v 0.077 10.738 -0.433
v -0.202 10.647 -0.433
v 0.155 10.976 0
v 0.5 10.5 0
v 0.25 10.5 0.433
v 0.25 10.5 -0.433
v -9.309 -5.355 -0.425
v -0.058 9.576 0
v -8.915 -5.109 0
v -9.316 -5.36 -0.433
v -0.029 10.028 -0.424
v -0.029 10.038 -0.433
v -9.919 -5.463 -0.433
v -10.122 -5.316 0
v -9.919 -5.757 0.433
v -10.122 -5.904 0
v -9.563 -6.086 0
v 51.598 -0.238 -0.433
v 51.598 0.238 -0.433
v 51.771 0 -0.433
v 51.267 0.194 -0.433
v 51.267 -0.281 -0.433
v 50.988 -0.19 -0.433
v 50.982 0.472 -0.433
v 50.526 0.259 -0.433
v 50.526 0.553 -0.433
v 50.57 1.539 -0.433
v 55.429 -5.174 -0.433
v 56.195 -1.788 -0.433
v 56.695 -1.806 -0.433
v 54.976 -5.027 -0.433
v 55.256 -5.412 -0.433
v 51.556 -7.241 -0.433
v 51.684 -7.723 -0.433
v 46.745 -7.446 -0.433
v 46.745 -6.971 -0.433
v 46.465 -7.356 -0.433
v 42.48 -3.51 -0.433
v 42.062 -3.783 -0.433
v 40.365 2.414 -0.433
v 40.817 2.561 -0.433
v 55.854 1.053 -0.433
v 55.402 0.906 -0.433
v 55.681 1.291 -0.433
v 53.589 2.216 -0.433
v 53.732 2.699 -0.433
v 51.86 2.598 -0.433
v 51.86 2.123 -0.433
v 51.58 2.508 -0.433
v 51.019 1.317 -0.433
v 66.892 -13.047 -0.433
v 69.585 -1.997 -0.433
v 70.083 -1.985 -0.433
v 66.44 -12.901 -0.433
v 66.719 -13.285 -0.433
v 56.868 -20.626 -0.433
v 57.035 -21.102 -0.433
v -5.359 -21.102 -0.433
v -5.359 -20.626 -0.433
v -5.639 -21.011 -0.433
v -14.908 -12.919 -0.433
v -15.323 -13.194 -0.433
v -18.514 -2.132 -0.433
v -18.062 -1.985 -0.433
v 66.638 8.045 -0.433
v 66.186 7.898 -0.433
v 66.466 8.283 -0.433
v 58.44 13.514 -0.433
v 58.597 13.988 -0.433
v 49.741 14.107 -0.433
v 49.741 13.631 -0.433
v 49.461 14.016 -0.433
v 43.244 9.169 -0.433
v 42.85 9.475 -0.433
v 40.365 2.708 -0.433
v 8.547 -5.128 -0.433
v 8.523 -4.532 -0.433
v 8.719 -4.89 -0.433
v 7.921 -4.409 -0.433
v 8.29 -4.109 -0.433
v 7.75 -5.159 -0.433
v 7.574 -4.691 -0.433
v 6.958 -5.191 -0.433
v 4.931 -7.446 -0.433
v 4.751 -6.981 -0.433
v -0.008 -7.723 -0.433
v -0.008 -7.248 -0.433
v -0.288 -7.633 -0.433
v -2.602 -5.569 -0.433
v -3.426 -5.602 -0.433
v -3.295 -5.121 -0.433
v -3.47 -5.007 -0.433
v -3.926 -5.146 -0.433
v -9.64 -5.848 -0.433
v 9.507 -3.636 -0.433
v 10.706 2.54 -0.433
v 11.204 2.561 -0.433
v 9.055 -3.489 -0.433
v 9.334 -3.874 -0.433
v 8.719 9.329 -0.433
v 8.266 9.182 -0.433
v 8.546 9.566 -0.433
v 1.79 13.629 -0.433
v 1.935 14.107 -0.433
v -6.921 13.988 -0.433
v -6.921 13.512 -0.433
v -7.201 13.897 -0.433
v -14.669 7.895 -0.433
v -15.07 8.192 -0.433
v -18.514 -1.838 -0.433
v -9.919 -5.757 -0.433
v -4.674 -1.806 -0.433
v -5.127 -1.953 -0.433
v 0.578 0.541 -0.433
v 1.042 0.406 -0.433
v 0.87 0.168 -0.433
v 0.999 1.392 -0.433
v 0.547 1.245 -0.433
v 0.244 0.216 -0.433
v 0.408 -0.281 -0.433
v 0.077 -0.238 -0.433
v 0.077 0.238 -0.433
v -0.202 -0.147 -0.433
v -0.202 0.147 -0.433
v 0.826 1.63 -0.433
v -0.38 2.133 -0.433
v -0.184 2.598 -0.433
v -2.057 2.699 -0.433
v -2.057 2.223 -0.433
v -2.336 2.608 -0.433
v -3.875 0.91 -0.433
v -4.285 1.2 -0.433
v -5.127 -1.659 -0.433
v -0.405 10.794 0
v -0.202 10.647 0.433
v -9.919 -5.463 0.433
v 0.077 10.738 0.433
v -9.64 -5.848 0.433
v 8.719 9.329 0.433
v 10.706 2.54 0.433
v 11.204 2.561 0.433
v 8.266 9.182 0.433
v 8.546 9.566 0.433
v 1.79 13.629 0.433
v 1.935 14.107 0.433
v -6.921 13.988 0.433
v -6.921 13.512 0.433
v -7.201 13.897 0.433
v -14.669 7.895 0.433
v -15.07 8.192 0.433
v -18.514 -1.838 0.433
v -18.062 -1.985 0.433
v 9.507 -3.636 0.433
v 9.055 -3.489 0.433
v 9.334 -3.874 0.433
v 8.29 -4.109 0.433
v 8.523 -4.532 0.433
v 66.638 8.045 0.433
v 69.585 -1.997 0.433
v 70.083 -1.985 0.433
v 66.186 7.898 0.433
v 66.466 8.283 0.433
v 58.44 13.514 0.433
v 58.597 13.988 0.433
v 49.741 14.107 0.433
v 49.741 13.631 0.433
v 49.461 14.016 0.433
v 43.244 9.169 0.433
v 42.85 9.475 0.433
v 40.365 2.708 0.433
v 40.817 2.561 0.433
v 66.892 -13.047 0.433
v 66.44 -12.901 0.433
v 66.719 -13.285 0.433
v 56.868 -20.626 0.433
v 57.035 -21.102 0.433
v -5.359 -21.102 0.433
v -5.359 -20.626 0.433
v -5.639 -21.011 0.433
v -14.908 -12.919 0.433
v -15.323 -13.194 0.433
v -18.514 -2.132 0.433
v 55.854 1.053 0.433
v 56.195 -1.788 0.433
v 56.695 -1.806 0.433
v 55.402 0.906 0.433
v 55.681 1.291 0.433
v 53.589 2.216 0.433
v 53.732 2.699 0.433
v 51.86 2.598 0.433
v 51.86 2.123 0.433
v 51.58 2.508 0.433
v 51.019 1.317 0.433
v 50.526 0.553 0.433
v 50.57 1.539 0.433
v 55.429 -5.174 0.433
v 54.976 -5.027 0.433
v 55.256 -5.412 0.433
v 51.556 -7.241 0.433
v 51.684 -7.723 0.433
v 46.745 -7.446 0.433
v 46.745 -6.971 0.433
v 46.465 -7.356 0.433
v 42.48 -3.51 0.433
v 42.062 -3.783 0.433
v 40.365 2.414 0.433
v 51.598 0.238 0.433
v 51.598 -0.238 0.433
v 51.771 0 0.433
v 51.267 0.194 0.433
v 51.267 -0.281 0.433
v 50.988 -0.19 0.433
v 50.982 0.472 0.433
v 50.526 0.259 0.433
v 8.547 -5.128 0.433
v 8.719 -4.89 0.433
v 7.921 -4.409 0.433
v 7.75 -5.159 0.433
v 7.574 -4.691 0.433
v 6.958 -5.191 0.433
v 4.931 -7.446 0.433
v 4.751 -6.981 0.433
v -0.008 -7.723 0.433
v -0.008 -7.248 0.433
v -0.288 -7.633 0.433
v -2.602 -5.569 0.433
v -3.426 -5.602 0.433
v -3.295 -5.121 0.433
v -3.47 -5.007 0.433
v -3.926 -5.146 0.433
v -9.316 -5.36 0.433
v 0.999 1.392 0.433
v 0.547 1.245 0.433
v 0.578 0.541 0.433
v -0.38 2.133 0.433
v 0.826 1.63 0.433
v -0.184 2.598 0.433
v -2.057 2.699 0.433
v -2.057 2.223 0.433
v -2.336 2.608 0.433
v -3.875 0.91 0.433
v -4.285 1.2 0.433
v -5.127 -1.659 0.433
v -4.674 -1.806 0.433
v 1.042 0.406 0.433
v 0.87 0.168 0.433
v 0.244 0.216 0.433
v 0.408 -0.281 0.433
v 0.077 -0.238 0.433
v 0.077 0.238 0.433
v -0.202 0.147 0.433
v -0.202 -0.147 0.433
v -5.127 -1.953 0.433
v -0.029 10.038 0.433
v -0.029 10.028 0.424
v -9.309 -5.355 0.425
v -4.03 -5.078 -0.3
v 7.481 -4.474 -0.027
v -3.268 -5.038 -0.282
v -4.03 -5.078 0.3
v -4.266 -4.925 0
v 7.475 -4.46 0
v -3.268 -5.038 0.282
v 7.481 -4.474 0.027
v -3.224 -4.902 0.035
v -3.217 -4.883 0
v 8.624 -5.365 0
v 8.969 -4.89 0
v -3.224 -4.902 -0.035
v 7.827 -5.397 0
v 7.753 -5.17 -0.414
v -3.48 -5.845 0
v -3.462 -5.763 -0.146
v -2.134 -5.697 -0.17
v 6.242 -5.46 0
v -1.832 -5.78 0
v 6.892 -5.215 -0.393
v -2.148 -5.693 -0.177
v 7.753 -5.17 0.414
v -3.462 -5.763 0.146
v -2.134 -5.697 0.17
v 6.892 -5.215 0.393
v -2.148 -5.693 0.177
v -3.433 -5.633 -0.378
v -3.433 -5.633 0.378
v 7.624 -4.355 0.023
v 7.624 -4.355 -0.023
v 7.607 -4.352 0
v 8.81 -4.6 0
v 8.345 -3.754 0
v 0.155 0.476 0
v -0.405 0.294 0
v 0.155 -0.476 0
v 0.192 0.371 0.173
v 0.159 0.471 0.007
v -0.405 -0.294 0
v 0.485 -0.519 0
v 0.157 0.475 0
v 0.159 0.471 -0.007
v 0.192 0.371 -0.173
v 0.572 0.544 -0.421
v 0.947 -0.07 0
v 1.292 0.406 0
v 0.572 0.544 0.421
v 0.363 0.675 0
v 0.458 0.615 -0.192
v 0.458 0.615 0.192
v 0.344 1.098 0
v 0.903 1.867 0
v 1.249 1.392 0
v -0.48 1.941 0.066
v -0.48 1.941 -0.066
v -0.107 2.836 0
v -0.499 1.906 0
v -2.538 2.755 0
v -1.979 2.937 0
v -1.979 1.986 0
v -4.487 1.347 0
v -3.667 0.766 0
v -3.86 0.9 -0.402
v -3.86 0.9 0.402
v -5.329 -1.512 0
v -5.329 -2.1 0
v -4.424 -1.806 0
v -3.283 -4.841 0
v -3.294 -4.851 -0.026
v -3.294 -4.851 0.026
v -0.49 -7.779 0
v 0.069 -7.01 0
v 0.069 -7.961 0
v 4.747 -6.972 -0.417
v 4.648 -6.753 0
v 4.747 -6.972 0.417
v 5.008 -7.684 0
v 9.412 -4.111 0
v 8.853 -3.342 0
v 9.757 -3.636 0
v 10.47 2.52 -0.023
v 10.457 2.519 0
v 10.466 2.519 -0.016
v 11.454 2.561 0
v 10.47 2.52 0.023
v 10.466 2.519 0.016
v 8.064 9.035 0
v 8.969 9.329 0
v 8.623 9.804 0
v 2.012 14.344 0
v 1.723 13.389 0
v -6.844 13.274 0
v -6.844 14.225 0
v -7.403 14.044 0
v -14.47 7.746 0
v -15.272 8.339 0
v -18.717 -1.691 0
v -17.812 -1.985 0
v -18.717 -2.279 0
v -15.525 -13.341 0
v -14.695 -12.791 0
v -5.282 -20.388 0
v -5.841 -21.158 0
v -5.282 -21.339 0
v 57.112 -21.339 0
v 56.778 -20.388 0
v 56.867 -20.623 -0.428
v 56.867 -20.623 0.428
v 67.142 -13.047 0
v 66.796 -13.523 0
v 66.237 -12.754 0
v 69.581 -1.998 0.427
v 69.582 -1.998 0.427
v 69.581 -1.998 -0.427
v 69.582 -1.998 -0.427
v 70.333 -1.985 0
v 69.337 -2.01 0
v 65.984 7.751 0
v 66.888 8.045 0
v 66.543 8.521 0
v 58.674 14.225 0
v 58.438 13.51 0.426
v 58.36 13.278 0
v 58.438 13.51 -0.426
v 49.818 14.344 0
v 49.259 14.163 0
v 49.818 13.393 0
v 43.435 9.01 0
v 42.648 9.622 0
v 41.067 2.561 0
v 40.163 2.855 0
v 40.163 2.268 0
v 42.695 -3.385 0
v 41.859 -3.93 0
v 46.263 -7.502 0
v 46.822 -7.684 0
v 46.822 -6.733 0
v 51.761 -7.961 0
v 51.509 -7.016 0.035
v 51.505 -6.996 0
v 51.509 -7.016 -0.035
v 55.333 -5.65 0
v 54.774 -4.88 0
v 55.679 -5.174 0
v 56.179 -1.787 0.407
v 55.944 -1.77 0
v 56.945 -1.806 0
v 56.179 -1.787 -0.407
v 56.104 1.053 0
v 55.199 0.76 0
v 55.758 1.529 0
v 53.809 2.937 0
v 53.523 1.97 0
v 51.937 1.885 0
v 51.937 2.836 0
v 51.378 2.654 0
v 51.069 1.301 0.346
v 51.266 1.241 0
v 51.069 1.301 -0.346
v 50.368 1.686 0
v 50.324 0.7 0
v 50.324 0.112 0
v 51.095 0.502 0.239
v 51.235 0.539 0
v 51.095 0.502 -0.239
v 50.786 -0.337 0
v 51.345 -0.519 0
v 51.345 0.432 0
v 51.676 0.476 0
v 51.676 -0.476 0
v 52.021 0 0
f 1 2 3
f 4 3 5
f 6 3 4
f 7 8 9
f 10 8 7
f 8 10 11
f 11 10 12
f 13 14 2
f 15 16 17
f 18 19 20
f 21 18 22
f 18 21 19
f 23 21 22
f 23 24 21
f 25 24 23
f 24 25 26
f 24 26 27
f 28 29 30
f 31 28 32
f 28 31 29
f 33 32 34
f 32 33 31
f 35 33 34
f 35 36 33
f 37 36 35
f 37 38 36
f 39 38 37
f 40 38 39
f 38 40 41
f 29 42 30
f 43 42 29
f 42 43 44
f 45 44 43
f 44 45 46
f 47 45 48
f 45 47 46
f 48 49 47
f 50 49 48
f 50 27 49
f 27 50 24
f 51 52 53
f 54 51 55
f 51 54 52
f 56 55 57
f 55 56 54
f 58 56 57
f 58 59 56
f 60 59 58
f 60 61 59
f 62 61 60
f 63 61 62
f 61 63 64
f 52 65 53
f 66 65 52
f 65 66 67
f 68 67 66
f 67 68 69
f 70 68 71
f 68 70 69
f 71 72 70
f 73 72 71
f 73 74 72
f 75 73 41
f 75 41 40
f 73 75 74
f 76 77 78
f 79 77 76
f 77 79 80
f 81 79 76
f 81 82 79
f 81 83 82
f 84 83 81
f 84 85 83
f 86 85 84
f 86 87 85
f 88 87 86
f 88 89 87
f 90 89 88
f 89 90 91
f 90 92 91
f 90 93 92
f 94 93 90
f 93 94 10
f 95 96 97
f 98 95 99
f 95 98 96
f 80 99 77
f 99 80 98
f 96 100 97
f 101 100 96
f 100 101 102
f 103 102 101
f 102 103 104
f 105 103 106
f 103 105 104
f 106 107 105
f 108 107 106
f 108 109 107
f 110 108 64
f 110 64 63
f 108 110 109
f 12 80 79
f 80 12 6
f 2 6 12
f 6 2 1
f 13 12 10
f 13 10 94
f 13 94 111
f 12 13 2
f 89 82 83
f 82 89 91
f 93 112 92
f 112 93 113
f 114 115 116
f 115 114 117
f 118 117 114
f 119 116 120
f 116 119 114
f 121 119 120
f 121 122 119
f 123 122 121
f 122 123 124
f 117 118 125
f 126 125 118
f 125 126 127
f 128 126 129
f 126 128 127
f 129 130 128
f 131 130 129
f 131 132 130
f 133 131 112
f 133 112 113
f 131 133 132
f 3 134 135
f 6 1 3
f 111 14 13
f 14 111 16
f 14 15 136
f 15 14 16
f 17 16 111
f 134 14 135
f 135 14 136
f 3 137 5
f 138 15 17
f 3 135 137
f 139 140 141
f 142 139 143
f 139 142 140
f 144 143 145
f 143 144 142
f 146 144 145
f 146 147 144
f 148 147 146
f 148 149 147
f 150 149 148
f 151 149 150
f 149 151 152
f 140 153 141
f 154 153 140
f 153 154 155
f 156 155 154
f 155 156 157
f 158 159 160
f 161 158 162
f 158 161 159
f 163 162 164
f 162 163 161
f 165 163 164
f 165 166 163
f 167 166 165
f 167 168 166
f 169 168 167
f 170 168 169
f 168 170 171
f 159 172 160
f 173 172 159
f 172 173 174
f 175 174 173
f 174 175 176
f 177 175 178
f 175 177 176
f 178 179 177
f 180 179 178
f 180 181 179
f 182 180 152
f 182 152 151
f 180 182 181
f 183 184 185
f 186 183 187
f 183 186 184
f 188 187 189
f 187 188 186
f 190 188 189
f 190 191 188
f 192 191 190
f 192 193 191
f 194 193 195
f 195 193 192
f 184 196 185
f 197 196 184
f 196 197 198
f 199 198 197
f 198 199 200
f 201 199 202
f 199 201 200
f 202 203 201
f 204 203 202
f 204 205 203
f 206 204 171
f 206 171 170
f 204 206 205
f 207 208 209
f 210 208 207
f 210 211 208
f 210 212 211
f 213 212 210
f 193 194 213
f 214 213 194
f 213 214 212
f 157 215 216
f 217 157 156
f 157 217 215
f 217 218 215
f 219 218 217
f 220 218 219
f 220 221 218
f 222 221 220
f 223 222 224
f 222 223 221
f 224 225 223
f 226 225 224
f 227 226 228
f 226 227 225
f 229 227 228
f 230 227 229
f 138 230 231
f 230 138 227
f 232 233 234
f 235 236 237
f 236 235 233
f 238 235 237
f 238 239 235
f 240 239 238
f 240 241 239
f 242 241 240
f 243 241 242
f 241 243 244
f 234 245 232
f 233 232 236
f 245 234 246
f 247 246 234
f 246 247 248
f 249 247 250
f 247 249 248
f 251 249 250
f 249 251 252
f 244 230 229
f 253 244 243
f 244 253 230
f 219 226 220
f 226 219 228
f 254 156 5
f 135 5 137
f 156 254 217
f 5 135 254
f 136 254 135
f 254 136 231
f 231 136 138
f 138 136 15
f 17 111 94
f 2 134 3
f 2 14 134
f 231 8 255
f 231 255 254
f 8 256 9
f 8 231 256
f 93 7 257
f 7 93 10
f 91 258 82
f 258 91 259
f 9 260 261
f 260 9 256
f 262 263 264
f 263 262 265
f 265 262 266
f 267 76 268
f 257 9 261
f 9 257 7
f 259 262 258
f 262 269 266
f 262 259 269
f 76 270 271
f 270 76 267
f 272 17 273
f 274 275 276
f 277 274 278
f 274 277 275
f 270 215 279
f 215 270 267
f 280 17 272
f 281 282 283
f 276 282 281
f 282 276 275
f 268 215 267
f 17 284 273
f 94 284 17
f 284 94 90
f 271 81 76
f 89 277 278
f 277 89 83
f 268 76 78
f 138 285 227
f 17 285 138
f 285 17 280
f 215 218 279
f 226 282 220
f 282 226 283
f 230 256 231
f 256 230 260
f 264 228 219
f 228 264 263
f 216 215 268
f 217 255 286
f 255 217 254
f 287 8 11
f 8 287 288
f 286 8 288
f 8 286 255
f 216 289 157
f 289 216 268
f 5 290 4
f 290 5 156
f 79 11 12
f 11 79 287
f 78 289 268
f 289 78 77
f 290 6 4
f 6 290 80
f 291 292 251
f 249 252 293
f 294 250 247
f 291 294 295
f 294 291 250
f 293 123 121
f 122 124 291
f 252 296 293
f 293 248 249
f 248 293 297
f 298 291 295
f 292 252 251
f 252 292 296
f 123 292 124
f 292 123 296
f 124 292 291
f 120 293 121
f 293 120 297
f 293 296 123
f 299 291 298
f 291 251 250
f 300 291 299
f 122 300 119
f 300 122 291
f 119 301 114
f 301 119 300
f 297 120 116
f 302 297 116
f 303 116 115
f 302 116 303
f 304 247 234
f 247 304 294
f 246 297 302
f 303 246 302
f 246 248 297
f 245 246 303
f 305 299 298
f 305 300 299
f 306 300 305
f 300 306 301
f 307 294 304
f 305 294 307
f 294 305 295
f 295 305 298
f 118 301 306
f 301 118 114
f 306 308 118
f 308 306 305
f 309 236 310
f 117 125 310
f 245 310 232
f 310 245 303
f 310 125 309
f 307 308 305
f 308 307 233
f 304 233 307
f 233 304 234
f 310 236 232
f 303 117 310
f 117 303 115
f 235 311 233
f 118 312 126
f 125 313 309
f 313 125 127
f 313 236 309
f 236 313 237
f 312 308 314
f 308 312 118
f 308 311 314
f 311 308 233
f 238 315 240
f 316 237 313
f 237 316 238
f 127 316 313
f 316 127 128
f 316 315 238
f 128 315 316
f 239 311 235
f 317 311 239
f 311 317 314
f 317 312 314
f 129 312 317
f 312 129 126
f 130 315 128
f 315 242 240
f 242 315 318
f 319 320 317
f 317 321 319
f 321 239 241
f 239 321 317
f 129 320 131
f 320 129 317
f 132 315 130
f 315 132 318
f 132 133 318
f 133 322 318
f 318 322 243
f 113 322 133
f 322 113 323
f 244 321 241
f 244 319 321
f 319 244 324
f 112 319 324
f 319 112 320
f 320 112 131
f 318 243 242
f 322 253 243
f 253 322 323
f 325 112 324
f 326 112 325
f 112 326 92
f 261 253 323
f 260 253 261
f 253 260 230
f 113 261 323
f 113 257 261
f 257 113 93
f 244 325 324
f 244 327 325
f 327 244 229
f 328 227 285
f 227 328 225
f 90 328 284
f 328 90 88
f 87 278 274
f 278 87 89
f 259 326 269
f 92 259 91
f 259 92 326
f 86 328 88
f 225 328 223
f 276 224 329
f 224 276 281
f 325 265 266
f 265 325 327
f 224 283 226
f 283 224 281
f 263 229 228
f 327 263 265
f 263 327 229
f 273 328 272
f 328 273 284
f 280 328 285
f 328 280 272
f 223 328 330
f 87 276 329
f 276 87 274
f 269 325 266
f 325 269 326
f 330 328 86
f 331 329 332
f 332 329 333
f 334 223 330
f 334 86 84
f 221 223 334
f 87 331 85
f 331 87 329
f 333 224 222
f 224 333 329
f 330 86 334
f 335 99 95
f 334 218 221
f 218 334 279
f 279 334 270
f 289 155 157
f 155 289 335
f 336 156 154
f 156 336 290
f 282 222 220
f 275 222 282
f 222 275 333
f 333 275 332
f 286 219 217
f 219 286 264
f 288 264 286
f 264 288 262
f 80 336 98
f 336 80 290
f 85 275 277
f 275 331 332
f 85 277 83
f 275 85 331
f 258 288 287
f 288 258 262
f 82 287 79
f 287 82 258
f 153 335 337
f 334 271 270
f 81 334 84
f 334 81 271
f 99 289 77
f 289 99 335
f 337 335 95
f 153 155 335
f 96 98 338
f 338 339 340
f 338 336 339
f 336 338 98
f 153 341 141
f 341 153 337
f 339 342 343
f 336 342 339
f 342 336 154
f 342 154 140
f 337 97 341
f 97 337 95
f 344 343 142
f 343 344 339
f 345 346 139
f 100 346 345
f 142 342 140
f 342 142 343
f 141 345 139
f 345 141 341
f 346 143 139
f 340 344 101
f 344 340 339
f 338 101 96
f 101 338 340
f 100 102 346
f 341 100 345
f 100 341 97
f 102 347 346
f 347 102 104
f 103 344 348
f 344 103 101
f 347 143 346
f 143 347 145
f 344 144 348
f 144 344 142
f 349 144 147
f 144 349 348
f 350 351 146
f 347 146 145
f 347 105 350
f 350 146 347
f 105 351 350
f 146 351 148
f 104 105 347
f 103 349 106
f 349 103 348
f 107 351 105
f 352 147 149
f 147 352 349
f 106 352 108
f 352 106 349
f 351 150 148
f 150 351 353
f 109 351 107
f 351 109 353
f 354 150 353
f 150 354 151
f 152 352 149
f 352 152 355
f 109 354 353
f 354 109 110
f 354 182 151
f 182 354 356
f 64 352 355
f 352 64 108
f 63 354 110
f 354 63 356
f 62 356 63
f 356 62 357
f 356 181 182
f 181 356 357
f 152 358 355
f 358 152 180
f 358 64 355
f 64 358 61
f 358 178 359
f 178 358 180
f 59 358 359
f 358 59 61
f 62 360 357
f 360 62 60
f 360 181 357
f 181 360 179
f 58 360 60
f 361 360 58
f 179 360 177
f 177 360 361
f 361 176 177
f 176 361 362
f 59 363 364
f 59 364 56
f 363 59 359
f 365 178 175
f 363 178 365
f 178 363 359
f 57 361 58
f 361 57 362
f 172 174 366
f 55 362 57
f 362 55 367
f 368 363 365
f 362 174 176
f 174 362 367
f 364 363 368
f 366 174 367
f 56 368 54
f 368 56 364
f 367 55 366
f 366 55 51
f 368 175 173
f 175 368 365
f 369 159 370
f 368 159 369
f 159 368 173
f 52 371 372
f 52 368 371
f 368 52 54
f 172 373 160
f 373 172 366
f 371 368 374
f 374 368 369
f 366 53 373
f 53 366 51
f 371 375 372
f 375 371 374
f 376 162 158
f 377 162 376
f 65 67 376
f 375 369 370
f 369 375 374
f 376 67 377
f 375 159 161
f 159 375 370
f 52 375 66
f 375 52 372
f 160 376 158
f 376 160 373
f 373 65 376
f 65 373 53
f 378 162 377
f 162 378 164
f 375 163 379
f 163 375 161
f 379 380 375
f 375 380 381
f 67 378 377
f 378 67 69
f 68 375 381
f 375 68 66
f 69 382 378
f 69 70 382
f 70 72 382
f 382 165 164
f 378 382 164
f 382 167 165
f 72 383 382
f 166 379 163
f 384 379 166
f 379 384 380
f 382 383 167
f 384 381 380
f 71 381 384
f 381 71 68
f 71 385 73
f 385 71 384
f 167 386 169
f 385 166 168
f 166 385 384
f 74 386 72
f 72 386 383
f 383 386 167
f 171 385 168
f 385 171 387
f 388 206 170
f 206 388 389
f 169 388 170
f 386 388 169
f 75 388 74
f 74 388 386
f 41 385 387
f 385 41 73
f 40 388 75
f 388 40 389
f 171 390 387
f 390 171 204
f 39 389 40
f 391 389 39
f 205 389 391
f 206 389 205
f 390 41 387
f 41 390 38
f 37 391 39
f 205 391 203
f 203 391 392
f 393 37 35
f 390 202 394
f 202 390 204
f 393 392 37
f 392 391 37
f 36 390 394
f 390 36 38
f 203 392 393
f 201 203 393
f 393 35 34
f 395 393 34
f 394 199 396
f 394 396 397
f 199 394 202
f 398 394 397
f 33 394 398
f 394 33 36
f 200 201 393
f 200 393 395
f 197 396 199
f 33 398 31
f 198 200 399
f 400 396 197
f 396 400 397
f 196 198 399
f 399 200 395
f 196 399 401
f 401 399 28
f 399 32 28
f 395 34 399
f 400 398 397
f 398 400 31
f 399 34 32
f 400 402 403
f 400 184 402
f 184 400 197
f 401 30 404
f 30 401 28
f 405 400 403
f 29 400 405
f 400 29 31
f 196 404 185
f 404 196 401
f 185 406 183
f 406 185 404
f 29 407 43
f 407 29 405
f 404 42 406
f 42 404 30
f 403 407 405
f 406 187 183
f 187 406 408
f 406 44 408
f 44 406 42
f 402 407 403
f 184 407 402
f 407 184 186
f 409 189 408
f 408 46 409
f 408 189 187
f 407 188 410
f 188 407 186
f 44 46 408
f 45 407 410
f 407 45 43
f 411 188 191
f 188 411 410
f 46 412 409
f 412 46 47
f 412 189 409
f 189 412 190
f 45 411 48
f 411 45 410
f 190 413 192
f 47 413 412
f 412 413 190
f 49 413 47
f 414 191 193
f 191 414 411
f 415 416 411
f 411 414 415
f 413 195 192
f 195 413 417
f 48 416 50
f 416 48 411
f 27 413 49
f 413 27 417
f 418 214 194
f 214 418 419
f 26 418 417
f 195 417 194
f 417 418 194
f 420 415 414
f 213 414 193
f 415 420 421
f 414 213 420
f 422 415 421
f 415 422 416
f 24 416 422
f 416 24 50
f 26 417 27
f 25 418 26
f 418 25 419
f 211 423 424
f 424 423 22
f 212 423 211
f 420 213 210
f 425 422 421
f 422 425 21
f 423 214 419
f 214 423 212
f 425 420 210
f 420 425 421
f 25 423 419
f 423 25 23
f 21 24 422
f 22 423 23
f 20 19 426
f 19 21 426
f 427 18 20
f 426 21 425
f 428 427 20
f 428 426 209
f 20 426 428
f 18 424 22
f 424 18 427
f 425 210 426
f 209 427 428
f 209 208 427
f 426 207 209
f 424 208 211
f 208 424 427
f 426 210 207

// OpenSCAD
// rotation matrix implementation
// OpenSCAD seems to do this slightly different from Wikipedia
// c.f. https://en.wikipedia.org/wiki/Rotation_matrix#Basic_rotations
function rot2Mat(rotVec, axis) =
    (len(rotVec) == 2) ?
        rot2Mat([rotVec[0], rotVec[1], 0], axis) :
    (axis == "x") ?
        [[1,              0,               0],
         [0, cos(rotVec[0]),  sin(rotVec[0])],
         [0, sin(rotVec[0]), -cos(rotVec[0])]] :
    (axis == "y") ?
        [[ cos(rotVec[1]), 0, sin(rotVec[1])],
         [              0, 1,              0],
         [-sin(rotVec[1]), 0, cos(rotVec[1])]] :
    (axis == "z") ?
        [[ cos(rotVec[2]), sin(rotVec[2]), 0],
         [-sin(rotVec[2]), cos(rotVec[2]), 0],
         [0,              0,               1]] : undef;

// convert point to 3D by setting Z to zero (if not present)
function c3D(tPoints) = 
    (len(tPoints[0]) < 3) ?
        tPoints * [[1,0,0],[0,1,0]] :
        tPoints;

// rotate [2D] points using a specificed XYZ rotation vector
function myRotate(rotation, points) =
    c3D(points) * rot2Mat(rotation, "x")
           * rot2Mat(rotation, "y")
           * rot2Mat(rotation, "z");    
    
// Determine spherical rotation for cartesian coordinates
function rToS(pt) = 
    [-acos((pt[2]) / norm(pt)), 
	 0, 
	 -atan2(pt[0],pt[1])];

// Generate a line between two points in 3D space
module line3D(p1,p2){
  translate((p1+p2)/2)
    rotate(rToS(p1-p2))
       cylinder(r=1, h=norm(p1-p2), center = true, $fn = 3);
}

// Flattens an array down one level (removing the enclosing array)
function flatten(pointArray, done=0, res=[]) =
    (done == len(pointArray)) ?
        res :
        flatten(pointArray=pointArray, done=done+1, 
            res=concat(res,pointArray[done]));

// Creates a polyhedron face
function phFace(pp, tp, base, add=0) =
    [base + add, (base+1) % pp + add,
     (((base+1) % pp) + pp + add) % tp, (base + pp + add) % tp];

function add(vecArg, scArg, res=[]) = 
    (len(res) >= len(vecArg)) ?
        res :
        add(vecArg, scArg, res=concat(res,[vecArg[len(res)]+scArg]));

// Generate an extruded polyhedron from an array of points
// boolean argument "closed" indicates whether to close up the 
// start and end polygon
module makeExtrudedPoly(ex, merge=false, trimEnds=false){
    ps = flatten(ex);
    pp = len(ex[1]); // points in one polygon
    tp = len(ex[1]) * len(ex); // total number of points
    if(!merge && !trimEnds){
        polyhedron(points=ps, faces=concat(
            [[for (i = [pp-1  : -1 :    0]) i]],
            [[for (i = [tp-pp :  1 : tp-1]) i]],
            [for (pt=[0:(len(ex)-2)])
                for(i = [0:pp-1]) phFace(pp,tp,i,pt*pp)],
            [])
        );
    } else if(trimEnds) {
        polyhedron(points=ps, faces=concat(
            [[for (i = [pp*2-1  : -1 :    pp]) i]],
            [[for (i = [tp-pp*2 :  1 : tp-pp-1]) i]],
            [for (pt=[1:(len(ex)-3)])
                for(i = [0:pp-1]) phFace(pp,tp,i,pt*pp)]));
    } else {
        polyhedron(points=ps, faces=
            [for (pt=[0:(len(ex)-1)])
                for(i = [0:pp-1]) phFace(pp,tp,i,pt*pp)]);
    }
}

// Extrude polygon along a path
module path_extrude(points, path, pos=0, merge=false, trimEnds=false, doRotate=true,
                    doScale=false, extruded=[]){
    if((len(points) > 0) && (len(path) > 0) && (len(points[0]) > 1)){
        if(len(extruded) >= (len(path))){
            // extrusion is finished, so construct the object
            //echo(extruded);
            makeExtrudedPoly(extruded, merge=merge, trimEnds=trimEnds);
        } else {
            sPoints = (doScale ? (points*doScale[pos]) : points );
            // generate points from rotating polygon
            if(merge || (pos < (len(path) - 1))){
                if((pos == 0) && (!merge)) {
                    newPts = (doRotate?(myRotate(rToS(path[1] - path[0]),sPoints)):c3D(sPoints));
                    path_extrude(points=points, path=path, pos=pos+1, 
                        merge=merge, trimEnds=trimEnds, doRotate=doRotate, doScale=doScale,
                        extruded=concat(extruded, [add(newPts,path[pos])]));
                } else {
                    newPts = (doRotate?(myRotate(rToS(path[(pos+1) % len(path)] 
                        - path[(pos+len(path)-1) % len(path)]),
                        sPoints)):c3D(sPoints));
                    path_extrude(points=points, path=path, pos=pos+1,
                        merge=merge, trimEnds=trimEnds, doRotate=doRotate, doScale=doScale,
                        extruded=concat(extruded, [add(newPts,path[pos])]));
                }
            } else {
                newPts = (doRotate?(myRotate(rToS(path[pos] - path[pos-1]),sPoints)):c3D(sPoints));
                path_extrude(points=points, path=path, pos=pos+1,
                    merge=merge, trimEnds=trimEnds, doRotate=doRotate, doScale=doScale,
                    extruded=concat(extruded, [add(newPts,path[pos])]));
            }
        }
    }
} 




a=concat([rnd(0.5),rnd(0.75)],[for (k = [0:1:30])rnd(1)]);

 pts= close(FlowerF(10,20,round(rnd(0,2))*2+1,a,min(2,round(rnd(1,3))),min(2,round(rnd(1,3))) ,isteps=3));;
path=DS_Apiral_As_Line([0,0],[rnd(60)+40,0],turns=1.5+rnd(0.5),exponent=rnd(-3,3),steps= 20,bias= (0.5) );
polyline(pts); 
polyline(path); 

//   path_extrude(
//        pts,path, 
//         
//        closed = false
//    ); 


function close(p)= concat(p,[p[0]]); 

function vsum(l) = len(l) > 0 ? [ for(li=l) 1 ] * l : undef;

 


 



module polyline(p) {for(i=[0:max(0,len(p)-2)])line(p[i],p[i+1]);}

module polyplot(p) {for(i=[0:max(0,len(p)-1)])translate(p[i])sphere(1);}

module line(p1, p2 ,width=0.5) { hull() {        
translate(p1) sphere(width,$fn=5);
translate(p2) sphere(width,$fn=5); } }

function L_Spiral (radius = 50,turns ,exponent=1.685,start_angle=45,
steps=50,p1,p2)
=  [for(a = [1/steps:1/steps: 1  ])[ 
(radius * fx2(1-a, exponent)) * cos(start_angle+ a* abs(turns)*360*sign(turns)),
(radius * fx2(1-a, exponent)) * sin(start_angle+a* abs(turns)*360*sign(turns) ),0]+p1 ];

//function D_Apiral_As_Line(p1,p2,turns=3,exponent=1.685 ,steps=150,bias=0.392)=
//let(p3=lerp(p1,p2,bias) )concat(
//reverse(L_Spiral (radius=norm(p1-p3),turns =2*turns*(bias),exponent=exponent,start_angle=atan2((p3-p1).y,(p3-p1).x),steps=steps,p1=p1,p2=p3)),
//(L_Spiral (radius=norm(p2-p3),turns =2*turns*(1-bias),exponent=exponent,start_angle=atan2((p3-p2).y,(p3-p2).x),steps=steps,p1=p2,p2=p3)    ));
//
function DS_Apiral_As_Line(p1,p2,turns=3,exponenti=1.685 ,steps=10,bias=0.392)=
let(p3=lerp(p1,p2,bias) )concat(
reverse
(L_Spiral (radius=norm(p1-p3)*0.9,turns =- turns ,exponent=exponent,start_angle=atan2((p3-p1).y,(p3-p1).x)-70,steps=steps,p1=p1,p2=p3)),
(L_Spiral (radius=norm(p2-p3)*0.9,turns =( turns ),exponent=exponent,start_angle=atan2((p3-p2).y,(p3-p2).x)+70,steps=steps,p1=p2,p2=p3)    ));
//
////
////function L_Apiral_As_Line(p1,p2,turns=3,exponent=1.685 ,steps=150)=
//L_Spiral (radius=norm(p1-p2),turns =turns,exponent=exponent,start_angle=atan2((p2-p1).y,(p2-p1).x),steps=steps,p1=p1,p2=p2);

function fx2(x,n) = n<0?pow(max(0,x),1/abs(min(-1,n-1) )):pow(max(0,x),max(1,n+1))   ;
function reverse(l) = len(l)>0 ? 
[ for(i=[len(l)-1:-1:0]) l[i] ] : len(l)==0 ? [] : undef; 
function lerp(start, end, bias) = (end * bias + start * (1 - bias));
function rnd(a = 1, b = 0, s = []) = 
s == [] ? 
(rands(min(a, b), max(   a, b), 1)[0]) 
: 
(rands(min(a, b), max(a, b), 1, s)[0])
; 


function FlowerF(r=1,isteps=5,w,a,h=2,h2)=
let(steps=min(isteps*w,300))
reverse([  for(t=[0:1/steps:1])
let( r2= r*1.05+vsum([
for (k = [h2:h:max(9,22-w)])     a[k]*(sin(k*t*w*360)/k)*r] ),
  x =r2* sin(t*360), 
 y =r2* cos(t*360)  )
[x,y] ]);
